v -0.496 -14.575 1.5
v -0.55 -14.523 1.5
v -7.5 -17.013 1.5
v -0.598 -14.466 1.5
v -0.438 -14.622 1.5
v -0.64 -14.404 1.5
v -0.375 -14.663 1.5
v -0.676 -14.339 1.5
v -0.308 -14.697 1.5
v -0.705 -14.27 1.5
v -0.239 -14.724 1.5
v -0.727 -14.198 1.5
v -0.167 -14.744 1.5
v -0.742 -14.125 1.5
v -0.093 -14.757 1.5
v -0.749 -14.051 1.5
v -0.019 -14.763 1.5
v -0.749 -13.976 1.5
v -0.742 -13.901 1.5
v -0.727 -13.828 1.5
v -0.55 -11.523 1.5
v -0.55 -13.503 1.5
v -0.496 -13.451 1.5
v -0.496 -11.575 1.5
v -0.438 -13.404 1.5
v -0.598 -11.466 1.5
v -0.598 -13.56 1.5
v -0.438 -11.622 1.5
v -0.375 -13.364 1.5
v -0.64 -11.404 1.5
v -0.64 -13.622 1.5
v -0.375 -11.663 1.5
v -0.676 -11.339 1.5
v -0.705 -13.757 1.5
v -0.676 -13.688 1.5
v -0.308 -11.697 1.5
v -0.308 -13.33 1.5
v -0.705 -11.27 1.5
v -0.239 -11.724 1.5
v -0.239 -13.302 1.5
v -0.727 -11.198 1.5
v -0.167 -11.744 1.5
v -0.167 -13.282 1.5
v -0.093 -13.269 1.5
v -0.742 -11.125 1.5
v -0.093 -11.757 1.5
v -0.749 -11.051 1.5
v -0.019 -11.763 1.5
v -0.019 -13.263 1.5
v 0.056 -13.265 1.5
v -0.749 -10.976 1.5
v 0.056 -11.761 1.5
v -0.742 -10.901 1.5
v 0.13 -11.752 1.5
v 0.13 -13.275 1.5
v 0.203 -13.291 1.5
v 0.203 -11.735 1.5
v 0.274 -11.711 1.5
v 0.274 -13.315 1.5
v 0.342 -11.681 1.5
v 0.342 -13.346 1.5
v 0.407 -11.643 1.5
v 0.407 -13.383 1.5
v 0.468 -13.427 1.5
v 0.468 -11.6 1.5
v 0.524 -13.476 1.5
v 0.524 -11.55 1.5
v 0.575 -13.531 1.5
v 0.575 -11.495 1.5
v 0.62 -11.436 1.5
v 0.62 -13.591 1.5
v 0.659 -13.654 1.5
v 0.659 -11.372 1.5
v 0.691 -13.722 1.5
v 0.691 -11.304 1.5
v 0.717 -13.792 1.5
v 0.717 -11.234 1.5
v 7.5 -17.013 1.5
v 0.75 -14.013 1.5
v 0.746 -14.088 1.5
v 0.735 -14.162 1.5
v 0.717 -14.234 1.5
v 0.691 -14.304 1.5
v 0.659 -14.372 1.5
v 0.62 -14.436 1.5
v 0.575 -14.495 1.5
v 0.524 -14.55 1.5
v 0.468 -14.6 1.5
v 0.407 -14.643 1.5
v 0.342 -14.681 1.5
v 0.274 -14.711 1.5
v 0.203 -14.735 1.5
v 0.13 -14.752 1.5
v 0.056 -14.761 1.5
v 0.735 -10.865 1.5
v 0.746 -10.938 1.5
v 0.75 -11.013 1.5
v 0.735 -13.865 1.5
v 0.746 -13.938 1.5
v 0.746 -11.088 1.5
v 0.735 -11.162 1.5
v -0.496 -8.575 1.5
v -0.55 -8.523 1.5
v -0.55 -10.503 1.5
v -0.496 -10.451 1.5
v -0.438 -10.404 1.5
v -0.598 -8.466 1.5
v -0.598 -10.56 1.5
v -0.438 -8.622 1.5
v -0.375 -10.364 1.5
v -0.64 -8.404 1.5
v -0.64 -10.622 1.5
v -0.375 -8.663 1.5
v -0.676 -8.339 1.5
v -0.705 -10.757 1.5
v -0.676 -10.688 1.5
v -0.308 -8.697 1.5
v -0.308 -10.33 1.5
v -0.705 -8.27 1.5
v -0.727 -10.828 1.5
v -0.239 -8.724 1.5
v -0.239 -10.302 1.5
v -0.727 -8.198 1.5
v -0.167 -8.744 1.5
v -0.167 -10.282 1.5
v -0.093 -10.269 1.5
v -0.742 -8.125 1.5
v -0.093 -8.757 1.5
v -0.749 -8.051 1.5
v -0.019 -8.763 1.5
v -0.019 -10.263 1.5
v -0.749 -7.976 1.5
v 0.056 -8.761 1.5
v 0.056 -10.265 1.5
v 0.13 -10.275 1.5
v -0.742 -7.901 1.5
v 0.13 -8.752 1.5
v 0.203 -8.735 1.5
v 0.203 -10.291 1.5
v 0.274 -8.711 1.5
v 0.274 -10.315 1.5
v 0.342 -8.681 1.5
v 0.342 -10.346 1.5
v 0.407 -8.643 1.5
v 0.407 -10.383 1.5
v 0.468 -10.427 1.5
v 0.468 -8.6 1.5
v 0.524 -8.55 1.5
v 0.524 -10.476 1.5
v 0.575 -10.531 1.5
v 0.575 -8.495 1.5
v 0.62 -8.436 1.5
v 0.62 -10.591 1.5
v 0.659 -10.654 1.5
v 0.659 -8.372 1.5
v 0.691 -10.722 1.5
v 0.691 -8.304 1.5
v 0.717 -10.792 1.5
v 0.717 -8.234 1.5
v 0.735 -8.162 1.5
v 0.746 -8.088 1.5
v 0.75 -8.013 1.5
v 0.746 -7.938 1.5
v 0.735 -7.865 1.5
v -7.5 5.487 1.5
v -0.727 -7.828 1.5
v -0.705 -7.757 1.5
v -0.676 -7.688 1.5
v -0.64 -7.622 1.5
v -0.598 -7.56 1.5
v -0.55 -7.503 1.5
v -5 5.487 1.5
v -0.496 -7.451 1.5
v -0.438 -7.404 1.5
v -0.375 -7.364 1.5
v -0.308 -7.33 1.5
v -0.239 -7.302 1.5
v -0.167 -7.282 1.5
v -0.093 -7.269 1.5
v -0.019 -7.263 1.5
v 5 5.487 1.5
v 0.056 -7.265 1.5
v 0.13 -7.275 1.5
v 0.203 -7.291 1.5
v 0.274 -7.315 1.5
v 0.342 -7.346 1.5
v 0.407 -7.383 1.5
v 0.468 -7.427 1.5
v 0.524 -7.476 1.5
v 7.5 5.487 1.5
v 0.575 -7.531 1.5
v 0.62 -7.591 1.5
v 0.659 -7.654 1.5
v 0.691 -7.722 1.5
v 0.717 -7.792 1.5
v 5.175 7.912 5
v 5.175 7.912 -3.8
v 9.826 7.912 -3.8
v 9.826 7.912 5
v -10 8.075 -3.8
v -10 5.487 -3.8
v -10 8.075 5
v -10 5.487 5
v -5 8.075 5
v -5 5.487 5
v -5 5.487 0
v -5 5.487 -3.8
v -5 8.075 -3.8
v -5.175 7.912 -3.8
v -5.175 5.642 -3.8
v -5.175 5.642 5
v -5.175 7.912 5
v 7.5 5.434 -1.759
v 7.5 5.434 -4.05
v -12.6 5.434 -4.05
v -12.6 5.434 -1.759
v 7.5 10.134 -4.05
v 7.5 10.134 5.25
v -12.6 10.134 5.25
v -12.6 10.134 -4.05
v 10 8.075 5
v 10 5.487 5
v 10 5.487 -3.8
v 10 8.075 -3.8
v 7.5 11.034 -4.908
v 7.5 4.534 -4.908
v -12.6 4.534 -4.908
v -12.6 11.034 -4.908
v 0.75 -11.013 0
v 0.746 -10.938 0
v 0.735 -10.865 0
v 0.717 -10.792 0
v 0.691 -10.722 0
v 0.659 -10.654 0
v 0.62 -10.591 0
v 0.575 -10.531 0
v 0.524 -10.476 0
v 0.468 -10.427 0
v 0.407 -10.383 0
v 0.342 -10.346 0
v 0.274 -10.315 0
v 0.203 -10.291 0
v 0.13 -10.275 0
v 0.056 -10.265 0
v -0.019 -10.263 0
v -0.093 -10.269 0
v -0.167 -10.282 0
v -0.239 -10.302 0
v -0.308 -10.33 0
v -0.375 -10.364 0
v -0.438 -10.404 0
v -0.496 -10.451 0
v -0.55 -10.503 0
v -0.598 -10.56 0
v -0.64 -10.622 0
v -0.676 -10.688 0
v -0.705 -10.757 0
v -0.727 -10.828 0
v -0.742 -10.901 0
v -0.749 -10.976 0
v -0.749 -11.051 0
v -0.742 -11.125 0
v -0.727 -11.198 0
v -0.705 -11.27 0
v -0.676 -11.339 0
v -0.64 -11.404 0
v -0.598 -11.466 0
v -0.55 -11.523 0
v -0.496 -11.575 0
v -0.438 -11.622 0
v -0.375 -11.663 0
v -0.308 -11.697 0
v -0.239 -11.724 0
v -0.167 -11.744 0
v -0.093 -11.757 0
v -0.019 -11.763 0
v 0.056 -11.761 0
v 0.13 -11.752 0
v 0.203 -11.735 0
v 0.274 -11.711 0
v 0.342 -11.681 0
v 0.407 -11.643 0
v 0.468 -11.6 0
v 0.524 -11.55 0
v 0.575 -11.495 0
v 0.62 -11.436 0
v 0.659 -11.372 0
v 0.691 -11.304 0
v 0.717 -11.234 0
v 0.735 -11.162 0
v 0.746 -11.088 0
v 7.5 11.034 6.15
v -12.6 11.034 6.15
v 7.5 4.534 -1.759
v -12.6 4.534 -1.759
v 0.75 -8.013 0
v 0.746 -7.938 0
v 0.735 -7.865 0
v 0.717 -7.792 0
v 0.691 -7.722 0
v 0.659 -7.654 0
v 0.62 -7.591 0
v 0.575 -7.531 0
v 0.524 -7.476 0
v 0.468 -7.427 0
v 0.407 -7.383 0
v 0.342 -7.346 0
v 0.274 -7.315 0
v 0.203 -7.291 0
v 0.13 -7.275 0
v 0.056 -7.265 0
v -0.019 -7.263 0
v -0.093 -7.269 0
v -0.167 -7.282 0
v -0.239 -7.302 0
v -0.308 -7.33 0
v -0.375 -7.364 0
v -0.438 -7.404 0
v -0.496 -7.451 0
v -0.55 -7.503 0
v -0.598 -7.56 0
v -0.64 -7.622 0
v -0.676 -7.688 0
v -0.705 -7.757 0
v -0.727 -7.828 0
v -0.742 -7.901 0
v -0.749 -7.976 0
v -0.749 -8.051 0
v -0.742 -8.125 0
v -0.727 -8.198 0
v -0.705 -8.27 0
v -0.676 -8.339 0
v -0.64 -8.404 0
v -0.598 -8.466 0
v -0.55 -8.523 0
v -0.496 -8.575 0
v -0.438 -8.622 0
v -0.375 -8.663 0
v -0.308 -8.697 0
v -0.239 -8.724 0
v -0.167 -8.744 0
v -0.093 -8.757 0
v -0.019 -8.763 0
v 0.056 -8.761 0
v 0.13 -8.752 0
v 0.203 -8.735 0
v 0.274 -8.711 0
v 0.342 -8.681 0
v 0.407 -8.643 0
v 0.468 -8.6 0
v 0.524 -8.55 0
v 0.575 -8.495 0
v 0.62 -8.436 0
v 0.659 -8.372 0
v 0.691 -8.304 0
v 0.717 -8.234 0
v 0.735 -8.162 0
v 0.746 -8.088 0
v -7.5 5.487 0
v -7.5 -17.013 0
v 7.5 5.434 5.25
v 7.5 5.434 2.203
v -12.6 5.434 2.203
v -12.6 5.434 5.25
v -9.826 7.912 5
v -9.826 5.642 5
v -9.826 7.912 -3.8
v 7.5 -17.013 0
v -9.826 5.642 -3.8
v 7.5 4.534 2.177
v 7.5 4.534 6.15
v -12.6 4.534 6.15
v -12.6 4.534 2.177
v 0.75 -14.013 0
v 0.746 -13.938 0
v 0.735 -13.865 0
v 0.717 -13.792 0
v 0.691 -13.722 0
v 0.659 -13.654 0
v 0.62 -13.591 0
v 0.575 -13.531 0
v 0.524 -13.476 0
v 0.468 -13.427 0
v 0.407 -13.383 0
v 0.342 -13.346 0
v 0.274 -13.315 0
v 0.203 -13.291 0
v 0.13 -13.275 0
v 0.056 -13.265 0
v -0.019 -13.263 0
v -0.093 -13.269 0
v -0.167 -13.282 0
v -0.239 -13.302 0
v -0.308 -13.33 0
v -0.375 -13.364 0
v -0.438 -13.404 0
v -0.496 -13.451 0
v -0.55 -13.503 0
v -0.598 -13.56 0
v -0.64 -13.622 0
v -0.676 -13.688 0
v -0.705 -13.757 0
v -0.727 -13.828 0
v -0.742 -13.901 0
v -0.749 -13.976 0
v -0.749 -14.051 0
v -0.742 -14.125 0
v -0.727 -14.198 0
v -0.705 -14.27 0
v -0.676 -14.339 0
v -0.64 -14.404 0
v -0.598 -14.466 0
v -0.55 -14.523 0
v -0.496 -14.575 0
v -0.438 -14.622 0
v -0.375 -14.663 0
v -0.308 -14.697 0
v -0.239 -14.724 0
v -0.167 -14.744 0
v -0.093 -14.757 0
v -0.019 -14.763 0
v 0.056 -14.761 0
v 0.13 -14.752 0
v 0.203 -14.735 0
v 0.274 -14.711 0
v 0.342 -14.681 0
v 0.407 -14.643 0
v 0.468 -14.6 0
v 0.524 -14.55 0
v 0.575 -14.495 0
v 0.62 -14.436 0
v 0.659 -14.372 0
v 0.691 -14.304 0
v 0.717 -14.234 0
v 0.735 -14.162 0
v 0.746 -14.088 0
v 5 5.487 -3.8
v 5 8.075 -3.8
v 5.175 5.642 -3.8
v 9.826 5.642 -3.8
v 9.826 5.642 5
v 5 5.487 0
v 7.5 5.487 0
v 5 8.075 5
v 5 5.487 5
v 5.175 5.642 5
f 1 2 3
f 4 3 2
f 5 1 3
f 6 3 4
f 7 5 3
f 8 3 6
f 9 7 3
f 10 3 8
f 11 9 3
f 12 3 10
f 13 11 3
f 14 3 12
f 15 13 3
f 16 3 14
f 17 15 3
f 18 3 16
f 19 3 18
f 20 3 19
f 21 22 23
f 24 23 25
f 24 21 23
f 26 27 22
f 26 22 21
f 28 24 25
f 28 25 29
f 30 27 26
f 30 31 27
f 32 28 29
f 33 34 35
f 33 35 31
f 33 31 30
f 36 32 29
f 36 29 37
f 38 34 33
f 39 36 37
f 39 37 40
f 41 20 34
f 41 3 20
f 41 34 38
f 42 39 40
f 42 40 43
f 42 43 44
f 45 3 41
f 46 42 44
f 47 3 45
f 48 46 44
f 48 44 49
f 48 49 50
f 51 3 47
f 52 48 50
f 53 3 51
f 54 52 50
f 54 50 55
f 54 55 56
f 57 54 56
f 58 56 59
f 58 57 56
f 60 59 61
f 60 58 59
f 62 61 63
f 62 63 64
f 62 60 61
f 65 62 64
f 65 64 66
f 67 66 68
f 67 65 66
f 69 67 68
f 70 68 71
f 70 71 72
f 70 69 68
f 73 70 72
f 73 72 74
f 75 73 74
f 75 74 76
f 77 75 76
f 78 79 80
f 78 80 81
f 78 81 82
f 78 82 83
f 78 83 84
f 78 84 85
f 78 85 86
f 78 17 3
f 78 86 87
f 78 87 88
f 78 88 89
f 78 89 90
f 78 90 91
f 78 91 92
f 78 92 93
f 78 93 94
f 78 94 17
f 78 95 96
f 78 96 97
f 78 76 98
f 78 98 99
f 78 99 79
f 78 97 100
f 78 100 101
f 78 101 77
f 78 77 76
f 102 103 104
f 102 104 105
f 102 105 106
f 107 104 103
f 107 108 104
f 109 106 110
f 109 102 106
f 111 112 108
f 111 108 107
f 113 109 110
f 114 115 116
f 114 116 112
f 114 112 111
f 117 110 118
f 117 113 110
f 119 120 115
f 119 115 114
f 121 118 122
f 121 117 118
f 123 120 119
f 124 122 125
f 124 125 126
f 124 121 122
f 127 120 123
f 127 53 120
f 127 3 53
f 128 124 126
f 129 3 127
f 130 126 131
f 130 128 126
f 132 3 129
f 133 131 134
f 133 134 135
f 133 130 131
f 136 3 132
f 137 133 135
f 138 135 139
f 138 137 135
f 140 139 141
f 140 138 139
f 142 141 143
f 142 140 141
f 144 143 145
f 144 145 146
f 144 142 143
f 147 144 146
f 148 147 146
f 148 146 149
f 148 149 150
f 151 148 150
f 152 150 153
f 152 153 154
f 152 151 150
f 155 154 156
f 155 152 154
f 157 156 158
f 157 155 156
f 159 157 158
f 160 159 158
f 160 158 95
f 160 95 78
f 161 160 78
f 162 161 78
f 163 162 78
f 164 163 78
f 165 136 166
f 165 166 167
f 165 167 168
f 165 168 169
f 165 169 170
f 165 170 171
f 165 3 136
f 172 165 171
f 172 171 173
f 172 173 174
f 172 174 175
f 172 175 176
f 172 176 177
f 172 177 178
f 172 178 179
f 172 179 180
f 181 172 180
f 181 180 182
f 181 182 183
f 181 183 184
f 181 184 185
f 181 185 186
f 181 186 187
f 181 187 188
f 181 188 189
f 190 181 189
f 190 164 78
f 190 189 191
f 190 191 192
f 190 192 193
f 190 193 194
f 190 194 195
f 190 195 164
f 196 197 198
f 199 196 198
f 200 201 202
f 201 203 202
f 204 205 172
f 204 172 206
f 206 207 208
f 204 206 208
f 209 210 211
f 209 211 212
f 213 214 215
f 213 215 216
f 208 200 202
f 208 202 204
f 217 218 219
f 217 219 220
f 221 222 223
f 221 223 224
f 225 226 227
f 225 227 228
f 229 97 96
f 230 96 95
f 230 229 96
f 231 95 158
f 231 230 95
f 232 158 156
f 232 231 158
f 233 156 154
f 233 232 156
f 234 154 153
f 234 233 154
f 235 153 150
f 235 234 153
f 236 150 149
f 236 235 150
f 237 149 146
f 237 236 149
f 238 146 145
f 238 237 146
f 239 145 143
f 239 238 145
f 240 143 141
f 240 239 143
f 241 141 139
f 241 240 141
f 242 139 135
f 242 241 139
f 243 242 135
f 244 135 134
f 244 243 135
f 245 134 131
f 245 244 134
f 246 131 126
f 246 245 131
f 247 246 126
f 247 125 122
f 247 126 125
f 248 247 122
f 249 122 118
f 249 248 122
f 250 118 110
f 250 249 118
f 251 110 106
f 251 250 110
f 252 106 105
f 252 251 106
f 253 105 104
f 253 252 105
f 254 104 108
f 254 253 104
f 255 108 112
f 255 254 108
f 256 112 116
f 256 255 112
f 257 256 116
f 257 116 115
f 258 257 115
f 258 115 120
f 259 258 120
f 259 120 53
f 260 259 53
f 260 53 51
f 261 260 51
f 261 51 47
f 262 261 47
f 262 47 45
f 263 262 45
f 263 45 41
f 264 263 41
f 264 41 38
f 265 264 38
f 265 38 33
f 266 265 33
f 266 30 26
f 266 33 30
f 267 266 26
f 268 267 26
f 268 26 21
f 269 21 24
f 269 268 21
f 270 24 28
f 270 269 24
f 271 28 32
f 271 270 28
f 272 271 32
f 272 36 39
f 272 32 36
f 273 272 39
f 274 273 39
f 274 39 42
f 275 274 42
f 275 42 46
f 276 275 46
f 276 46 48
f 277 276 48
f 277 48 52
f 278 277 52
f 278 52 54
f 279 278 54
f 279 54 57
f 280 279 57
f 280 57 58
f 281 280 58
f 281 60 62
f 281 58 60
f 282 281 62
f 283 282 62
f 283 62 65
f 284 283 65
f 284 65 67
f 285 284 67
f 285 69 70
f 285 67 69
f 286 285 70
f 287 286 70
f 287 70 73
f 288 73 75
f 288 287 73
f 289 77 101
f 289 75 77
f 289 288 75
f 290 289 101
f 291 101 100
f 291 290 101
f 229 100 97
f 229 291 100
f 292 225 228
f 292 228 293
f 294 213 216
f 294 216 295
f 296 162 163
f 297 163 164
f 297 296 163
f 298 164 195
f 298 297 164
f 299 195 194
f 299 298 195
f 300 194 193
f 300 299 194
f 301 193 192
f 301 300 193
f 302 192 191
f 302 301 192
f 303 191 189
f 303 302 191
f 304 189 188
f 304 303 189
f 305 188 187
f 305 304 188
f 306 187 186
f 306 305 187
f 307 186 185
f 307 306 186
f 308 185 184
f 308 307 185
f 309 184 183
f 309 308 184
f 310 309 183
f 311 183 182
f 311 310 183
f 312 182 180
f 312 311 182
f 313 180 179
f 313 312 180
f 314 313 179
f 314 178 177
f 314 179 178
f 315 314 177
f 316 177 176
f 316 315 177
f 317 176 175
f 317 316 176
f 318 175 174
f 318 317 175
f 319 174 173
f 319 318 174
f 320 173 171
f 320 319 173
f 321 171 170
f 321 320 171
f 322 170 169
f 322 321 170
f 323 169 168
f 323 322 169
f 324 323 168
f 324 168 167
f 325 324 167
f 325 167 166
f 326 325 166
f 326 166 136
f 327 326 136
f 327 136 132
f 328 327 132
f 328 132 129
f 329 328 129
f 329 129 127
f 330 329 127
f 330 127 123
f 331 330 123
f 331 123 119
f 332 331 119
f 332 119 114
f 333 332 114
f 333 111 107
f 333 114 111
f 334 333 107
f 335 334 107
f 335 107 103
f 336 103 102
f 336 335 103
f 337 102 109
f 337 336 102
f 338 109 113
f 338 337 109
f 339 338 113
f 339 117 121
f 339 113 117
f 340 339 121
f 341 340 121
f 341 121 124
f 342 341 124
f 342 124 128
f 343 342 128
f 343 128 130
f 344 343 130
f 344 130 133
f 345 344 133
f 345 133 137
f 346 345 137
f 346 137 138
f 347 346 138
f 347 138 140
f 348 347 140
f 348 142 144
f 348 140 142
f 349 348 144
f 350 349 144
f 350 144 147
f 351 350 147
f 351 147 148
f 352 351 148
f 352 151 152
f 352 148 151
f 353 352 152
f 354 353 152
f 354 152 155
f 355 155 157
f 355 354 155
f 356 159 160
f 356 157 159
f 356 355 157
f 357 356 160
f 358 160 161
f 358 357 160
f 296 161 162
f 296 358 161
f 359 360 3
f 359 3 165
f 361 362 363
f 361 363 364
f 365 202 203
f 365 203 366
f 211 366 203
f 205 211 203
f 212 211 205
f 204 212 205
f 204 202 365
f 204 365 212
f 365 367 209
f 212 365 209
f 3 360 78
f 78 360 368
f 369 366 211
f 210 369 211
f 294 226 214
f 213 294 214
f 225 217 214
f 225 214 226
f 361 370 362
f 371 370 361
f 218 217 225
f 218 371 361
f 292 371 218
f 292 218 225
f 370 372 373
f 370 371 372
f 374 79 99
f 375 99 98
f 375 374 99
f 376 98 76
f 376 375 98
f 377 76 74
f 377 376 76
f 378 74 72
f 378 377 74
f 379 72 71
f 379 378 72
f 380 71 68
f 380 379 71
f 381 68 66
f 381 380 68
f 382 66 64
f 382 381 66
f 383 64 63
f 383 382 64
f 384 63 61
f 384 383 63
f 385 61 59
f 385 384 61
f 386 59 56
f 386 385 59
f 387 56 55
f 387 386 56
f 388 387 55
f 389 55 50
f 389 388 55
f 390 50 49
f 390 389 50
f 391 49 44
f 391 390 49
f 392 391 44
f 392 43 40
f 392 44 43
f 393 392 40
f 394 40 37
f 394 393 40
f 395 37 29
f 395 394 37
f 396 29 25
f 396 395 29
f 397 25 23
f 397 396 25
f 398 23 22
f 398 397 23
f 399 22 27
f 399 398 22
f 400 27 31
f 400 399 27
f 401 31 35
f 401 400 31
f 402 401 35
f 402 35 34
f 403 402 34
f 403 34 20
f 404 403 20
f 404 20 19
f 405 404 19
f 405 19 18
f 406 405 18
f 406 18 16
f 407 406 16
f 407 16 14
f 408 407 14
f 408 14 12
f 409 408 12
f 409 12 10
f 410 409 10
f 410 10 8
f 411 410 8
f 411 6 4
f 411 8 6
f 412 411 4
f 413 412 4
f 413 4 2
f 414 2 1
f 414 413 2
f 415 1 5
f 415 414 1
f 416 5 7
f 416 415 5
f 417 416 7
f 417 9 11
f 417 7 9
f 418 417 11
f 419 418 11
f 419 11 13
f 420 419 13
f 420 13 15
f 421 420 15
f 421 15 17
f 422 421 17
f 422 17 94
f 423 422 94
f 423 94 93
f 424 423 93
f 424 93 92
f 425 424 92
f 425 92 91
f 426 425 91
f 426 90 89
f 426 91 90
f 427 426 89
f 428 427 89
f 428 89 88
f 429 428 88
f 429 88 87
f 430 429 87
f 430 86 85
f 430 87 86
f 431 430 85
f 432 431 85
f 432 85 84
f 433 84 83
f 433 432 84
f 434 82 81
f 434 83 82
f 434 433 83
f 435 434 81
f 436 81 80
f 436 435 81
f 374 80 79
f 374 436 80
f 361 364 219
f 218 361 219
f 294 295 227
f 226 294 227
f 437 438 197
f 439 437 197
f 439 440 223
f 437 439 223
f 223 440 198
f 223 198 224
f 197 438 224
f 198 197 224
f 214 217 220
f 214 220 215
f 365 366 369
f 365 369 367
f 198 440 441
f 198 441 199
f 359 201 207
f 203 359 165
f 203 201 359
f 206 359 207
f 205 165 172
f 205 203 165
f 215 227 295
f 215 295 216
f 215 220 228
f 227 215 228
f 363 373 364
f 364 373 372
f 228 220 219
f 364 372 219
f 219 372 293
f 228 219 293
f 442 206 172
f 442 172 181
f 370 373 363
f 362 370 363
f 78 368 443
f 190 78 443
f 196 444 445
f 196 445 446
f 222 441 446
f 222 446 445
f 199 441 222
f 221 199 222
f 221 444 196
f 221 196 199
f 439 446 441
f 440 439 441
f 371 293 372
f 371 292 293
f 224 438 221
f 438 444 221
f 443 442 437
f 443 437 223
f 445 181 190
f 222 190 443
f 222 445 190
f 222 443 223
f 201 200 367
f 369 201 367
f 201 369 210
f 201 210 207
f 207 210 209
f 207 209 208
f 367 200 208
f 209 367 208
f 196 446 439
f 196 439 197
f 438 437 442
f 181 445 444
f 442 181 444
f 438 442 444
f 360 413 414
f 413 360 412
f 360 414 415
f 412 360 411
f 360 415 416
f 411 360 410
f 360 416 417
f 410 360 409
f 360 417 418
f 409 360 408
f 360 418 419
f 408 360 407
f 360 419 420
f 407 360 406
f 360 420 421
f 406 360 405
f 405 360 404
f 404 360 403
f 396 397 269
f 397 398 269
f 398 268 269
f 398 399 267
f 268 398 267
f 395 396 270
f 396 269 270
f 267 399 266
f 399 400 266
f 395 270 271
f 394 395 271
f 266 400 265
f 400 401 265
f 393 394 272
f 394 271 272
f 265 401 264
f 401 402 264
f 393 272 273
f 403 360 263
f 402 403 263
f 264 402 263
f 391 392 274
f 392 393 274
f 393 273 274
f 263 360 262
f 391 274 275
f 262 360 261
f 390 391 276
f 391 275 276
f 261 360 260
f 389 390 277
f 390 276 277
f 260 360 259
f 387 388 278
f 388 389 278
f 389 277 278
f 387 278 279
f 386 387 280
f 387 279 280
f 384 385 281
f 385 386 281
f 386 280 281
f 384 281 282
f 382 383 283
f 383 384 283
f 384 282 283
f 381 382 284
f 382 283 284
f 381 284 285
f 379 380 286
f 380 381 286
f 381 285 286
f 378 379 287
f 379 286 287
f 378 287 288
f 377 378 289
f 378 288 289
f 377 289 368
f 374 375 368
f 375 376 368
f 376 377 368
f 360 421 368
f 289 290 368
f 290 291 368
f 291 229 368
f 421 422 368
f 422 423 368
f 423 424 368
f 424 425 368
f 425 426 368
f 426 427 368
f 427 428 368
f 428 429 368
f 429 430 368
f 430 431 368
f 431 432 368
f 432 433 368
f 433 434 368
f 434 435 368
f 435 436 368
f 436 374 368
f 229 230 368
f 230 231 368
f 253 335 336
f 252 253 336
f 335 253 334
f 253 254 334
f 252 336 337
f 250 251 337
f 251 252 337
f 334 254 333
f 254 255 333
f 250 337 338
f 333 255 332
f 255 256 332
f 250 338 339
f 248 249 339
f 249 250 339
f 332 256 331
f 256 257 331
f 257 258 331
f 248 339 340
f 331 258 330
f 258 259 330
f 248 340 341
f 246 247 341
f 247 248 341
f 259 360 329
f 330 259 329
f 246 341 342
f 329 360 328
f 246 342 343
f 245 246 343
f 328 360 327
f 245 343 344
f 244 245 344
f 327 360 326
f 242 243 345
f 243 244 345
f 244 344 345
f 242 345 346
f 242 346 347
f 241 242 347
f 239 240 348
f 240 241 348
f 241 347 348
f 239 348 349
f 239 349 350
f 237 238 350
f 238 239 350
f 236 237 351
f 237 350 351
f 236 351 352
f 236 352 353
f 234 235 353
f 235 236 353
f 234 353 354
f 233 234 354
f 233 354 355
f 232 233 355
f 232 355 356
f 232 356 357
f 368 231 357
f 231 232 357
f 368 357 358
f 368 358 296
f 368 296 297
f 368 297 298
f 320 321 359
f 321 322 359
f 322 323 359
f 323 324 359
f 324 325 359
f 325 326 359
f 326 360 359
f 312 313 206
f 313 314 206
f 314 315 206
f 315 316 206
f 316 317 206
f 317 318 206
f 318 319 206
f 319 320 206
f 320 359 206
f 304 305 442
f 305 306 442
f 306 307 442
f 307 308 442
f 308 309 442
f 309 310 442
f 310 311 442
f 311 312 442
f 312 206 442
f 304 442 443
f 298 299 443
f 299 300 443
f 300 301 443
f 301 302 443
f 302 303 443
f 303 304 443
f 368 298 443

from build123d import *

# Parameters (mm, degrees)
F0_W          = 15
F0_H          = 22.5
F1_DEPTH      = 1.5
F2_W          = 5
F2_H          = 2.587675
F2_W_2        = 4.650861
F2_H_2        = 2.27039
F3_DEPTH      = 5
F3_DEPTH_BACK = 3.8
F4_R          = 0.75
F5_DEPTH      = 25
F7_DEPTH      = 7.5
F7_DEPTH_BACK = 12.6


with BuildPart() as f1:
    # F0 (on Top) → F1 (new body)
    with BuildSketch(Plane.XY):
        with Locations((0, -5.76314)):
            Rectangle(F0_W, F0_H)
    extrude(amount=F1_DEPTH)

    # F2 (on Top) → F3 (join, two sides)
    with BuildSketch(Plane.XY) as f3_sk:
        with Locations((7.5, 6.780697)):
            Rectangle(F2_W, F2_H)
        with Locations((7.50068, 6.777079)):
            Rectangle(F2_W_2, F2_H_2, mode=Mode.SUBTRACT)
        with Locations((-7.5, 6.780697)):
            Rectangle(F2_W, F2_H)
        with Locations((-7.50068, 6.777079)):
            Rectangle(F2_W_2, F2_H_2, mode=Mode.SUBTRACT)
    extrude(amount=F3_DEPTH)
    extrude(f3_sk.sketch, amount=-F3_DEPTH_BACK)

    # F4 (on Top) → F5 (cut)
    with BuildSketch(Plane.XY):
        with Locations((0, -14.01314)):
            Circle(F4_R)
        with Locations((0, -11.01314)):
            Circle(F4_R)
        with Locations((0, -8.01314)):
            Circle(F4_R)
    extrude(amount=F5_DEPTH, mode=Mode.SUBTRACT)


with BuildPart() as f7:
    # F6 (on Right) → F7 (new body, two sides)
    with BuildSketch(Plane.YZ) as f7_sk:
        Polygon((4.533626, 2.177402), (5.433626, 2.202878), (5.433626, 5.25), (10.133626, 5.25), (10.133626, -4.05), (5.433626, -4.05), (5.433626, -1.759091), (4.533626, -1.759091), (4.533626, -4.908458), (11.033626, -4.908458), (11.033626, 6.15), (4.533626, 6.15), align=None)
    extrude(amount=F7_DEPTH)
    extrude(f7_sk.sketch, amount=-F7_DEPTH_BACK)


solid = Compound([f1.part, f7.part])
